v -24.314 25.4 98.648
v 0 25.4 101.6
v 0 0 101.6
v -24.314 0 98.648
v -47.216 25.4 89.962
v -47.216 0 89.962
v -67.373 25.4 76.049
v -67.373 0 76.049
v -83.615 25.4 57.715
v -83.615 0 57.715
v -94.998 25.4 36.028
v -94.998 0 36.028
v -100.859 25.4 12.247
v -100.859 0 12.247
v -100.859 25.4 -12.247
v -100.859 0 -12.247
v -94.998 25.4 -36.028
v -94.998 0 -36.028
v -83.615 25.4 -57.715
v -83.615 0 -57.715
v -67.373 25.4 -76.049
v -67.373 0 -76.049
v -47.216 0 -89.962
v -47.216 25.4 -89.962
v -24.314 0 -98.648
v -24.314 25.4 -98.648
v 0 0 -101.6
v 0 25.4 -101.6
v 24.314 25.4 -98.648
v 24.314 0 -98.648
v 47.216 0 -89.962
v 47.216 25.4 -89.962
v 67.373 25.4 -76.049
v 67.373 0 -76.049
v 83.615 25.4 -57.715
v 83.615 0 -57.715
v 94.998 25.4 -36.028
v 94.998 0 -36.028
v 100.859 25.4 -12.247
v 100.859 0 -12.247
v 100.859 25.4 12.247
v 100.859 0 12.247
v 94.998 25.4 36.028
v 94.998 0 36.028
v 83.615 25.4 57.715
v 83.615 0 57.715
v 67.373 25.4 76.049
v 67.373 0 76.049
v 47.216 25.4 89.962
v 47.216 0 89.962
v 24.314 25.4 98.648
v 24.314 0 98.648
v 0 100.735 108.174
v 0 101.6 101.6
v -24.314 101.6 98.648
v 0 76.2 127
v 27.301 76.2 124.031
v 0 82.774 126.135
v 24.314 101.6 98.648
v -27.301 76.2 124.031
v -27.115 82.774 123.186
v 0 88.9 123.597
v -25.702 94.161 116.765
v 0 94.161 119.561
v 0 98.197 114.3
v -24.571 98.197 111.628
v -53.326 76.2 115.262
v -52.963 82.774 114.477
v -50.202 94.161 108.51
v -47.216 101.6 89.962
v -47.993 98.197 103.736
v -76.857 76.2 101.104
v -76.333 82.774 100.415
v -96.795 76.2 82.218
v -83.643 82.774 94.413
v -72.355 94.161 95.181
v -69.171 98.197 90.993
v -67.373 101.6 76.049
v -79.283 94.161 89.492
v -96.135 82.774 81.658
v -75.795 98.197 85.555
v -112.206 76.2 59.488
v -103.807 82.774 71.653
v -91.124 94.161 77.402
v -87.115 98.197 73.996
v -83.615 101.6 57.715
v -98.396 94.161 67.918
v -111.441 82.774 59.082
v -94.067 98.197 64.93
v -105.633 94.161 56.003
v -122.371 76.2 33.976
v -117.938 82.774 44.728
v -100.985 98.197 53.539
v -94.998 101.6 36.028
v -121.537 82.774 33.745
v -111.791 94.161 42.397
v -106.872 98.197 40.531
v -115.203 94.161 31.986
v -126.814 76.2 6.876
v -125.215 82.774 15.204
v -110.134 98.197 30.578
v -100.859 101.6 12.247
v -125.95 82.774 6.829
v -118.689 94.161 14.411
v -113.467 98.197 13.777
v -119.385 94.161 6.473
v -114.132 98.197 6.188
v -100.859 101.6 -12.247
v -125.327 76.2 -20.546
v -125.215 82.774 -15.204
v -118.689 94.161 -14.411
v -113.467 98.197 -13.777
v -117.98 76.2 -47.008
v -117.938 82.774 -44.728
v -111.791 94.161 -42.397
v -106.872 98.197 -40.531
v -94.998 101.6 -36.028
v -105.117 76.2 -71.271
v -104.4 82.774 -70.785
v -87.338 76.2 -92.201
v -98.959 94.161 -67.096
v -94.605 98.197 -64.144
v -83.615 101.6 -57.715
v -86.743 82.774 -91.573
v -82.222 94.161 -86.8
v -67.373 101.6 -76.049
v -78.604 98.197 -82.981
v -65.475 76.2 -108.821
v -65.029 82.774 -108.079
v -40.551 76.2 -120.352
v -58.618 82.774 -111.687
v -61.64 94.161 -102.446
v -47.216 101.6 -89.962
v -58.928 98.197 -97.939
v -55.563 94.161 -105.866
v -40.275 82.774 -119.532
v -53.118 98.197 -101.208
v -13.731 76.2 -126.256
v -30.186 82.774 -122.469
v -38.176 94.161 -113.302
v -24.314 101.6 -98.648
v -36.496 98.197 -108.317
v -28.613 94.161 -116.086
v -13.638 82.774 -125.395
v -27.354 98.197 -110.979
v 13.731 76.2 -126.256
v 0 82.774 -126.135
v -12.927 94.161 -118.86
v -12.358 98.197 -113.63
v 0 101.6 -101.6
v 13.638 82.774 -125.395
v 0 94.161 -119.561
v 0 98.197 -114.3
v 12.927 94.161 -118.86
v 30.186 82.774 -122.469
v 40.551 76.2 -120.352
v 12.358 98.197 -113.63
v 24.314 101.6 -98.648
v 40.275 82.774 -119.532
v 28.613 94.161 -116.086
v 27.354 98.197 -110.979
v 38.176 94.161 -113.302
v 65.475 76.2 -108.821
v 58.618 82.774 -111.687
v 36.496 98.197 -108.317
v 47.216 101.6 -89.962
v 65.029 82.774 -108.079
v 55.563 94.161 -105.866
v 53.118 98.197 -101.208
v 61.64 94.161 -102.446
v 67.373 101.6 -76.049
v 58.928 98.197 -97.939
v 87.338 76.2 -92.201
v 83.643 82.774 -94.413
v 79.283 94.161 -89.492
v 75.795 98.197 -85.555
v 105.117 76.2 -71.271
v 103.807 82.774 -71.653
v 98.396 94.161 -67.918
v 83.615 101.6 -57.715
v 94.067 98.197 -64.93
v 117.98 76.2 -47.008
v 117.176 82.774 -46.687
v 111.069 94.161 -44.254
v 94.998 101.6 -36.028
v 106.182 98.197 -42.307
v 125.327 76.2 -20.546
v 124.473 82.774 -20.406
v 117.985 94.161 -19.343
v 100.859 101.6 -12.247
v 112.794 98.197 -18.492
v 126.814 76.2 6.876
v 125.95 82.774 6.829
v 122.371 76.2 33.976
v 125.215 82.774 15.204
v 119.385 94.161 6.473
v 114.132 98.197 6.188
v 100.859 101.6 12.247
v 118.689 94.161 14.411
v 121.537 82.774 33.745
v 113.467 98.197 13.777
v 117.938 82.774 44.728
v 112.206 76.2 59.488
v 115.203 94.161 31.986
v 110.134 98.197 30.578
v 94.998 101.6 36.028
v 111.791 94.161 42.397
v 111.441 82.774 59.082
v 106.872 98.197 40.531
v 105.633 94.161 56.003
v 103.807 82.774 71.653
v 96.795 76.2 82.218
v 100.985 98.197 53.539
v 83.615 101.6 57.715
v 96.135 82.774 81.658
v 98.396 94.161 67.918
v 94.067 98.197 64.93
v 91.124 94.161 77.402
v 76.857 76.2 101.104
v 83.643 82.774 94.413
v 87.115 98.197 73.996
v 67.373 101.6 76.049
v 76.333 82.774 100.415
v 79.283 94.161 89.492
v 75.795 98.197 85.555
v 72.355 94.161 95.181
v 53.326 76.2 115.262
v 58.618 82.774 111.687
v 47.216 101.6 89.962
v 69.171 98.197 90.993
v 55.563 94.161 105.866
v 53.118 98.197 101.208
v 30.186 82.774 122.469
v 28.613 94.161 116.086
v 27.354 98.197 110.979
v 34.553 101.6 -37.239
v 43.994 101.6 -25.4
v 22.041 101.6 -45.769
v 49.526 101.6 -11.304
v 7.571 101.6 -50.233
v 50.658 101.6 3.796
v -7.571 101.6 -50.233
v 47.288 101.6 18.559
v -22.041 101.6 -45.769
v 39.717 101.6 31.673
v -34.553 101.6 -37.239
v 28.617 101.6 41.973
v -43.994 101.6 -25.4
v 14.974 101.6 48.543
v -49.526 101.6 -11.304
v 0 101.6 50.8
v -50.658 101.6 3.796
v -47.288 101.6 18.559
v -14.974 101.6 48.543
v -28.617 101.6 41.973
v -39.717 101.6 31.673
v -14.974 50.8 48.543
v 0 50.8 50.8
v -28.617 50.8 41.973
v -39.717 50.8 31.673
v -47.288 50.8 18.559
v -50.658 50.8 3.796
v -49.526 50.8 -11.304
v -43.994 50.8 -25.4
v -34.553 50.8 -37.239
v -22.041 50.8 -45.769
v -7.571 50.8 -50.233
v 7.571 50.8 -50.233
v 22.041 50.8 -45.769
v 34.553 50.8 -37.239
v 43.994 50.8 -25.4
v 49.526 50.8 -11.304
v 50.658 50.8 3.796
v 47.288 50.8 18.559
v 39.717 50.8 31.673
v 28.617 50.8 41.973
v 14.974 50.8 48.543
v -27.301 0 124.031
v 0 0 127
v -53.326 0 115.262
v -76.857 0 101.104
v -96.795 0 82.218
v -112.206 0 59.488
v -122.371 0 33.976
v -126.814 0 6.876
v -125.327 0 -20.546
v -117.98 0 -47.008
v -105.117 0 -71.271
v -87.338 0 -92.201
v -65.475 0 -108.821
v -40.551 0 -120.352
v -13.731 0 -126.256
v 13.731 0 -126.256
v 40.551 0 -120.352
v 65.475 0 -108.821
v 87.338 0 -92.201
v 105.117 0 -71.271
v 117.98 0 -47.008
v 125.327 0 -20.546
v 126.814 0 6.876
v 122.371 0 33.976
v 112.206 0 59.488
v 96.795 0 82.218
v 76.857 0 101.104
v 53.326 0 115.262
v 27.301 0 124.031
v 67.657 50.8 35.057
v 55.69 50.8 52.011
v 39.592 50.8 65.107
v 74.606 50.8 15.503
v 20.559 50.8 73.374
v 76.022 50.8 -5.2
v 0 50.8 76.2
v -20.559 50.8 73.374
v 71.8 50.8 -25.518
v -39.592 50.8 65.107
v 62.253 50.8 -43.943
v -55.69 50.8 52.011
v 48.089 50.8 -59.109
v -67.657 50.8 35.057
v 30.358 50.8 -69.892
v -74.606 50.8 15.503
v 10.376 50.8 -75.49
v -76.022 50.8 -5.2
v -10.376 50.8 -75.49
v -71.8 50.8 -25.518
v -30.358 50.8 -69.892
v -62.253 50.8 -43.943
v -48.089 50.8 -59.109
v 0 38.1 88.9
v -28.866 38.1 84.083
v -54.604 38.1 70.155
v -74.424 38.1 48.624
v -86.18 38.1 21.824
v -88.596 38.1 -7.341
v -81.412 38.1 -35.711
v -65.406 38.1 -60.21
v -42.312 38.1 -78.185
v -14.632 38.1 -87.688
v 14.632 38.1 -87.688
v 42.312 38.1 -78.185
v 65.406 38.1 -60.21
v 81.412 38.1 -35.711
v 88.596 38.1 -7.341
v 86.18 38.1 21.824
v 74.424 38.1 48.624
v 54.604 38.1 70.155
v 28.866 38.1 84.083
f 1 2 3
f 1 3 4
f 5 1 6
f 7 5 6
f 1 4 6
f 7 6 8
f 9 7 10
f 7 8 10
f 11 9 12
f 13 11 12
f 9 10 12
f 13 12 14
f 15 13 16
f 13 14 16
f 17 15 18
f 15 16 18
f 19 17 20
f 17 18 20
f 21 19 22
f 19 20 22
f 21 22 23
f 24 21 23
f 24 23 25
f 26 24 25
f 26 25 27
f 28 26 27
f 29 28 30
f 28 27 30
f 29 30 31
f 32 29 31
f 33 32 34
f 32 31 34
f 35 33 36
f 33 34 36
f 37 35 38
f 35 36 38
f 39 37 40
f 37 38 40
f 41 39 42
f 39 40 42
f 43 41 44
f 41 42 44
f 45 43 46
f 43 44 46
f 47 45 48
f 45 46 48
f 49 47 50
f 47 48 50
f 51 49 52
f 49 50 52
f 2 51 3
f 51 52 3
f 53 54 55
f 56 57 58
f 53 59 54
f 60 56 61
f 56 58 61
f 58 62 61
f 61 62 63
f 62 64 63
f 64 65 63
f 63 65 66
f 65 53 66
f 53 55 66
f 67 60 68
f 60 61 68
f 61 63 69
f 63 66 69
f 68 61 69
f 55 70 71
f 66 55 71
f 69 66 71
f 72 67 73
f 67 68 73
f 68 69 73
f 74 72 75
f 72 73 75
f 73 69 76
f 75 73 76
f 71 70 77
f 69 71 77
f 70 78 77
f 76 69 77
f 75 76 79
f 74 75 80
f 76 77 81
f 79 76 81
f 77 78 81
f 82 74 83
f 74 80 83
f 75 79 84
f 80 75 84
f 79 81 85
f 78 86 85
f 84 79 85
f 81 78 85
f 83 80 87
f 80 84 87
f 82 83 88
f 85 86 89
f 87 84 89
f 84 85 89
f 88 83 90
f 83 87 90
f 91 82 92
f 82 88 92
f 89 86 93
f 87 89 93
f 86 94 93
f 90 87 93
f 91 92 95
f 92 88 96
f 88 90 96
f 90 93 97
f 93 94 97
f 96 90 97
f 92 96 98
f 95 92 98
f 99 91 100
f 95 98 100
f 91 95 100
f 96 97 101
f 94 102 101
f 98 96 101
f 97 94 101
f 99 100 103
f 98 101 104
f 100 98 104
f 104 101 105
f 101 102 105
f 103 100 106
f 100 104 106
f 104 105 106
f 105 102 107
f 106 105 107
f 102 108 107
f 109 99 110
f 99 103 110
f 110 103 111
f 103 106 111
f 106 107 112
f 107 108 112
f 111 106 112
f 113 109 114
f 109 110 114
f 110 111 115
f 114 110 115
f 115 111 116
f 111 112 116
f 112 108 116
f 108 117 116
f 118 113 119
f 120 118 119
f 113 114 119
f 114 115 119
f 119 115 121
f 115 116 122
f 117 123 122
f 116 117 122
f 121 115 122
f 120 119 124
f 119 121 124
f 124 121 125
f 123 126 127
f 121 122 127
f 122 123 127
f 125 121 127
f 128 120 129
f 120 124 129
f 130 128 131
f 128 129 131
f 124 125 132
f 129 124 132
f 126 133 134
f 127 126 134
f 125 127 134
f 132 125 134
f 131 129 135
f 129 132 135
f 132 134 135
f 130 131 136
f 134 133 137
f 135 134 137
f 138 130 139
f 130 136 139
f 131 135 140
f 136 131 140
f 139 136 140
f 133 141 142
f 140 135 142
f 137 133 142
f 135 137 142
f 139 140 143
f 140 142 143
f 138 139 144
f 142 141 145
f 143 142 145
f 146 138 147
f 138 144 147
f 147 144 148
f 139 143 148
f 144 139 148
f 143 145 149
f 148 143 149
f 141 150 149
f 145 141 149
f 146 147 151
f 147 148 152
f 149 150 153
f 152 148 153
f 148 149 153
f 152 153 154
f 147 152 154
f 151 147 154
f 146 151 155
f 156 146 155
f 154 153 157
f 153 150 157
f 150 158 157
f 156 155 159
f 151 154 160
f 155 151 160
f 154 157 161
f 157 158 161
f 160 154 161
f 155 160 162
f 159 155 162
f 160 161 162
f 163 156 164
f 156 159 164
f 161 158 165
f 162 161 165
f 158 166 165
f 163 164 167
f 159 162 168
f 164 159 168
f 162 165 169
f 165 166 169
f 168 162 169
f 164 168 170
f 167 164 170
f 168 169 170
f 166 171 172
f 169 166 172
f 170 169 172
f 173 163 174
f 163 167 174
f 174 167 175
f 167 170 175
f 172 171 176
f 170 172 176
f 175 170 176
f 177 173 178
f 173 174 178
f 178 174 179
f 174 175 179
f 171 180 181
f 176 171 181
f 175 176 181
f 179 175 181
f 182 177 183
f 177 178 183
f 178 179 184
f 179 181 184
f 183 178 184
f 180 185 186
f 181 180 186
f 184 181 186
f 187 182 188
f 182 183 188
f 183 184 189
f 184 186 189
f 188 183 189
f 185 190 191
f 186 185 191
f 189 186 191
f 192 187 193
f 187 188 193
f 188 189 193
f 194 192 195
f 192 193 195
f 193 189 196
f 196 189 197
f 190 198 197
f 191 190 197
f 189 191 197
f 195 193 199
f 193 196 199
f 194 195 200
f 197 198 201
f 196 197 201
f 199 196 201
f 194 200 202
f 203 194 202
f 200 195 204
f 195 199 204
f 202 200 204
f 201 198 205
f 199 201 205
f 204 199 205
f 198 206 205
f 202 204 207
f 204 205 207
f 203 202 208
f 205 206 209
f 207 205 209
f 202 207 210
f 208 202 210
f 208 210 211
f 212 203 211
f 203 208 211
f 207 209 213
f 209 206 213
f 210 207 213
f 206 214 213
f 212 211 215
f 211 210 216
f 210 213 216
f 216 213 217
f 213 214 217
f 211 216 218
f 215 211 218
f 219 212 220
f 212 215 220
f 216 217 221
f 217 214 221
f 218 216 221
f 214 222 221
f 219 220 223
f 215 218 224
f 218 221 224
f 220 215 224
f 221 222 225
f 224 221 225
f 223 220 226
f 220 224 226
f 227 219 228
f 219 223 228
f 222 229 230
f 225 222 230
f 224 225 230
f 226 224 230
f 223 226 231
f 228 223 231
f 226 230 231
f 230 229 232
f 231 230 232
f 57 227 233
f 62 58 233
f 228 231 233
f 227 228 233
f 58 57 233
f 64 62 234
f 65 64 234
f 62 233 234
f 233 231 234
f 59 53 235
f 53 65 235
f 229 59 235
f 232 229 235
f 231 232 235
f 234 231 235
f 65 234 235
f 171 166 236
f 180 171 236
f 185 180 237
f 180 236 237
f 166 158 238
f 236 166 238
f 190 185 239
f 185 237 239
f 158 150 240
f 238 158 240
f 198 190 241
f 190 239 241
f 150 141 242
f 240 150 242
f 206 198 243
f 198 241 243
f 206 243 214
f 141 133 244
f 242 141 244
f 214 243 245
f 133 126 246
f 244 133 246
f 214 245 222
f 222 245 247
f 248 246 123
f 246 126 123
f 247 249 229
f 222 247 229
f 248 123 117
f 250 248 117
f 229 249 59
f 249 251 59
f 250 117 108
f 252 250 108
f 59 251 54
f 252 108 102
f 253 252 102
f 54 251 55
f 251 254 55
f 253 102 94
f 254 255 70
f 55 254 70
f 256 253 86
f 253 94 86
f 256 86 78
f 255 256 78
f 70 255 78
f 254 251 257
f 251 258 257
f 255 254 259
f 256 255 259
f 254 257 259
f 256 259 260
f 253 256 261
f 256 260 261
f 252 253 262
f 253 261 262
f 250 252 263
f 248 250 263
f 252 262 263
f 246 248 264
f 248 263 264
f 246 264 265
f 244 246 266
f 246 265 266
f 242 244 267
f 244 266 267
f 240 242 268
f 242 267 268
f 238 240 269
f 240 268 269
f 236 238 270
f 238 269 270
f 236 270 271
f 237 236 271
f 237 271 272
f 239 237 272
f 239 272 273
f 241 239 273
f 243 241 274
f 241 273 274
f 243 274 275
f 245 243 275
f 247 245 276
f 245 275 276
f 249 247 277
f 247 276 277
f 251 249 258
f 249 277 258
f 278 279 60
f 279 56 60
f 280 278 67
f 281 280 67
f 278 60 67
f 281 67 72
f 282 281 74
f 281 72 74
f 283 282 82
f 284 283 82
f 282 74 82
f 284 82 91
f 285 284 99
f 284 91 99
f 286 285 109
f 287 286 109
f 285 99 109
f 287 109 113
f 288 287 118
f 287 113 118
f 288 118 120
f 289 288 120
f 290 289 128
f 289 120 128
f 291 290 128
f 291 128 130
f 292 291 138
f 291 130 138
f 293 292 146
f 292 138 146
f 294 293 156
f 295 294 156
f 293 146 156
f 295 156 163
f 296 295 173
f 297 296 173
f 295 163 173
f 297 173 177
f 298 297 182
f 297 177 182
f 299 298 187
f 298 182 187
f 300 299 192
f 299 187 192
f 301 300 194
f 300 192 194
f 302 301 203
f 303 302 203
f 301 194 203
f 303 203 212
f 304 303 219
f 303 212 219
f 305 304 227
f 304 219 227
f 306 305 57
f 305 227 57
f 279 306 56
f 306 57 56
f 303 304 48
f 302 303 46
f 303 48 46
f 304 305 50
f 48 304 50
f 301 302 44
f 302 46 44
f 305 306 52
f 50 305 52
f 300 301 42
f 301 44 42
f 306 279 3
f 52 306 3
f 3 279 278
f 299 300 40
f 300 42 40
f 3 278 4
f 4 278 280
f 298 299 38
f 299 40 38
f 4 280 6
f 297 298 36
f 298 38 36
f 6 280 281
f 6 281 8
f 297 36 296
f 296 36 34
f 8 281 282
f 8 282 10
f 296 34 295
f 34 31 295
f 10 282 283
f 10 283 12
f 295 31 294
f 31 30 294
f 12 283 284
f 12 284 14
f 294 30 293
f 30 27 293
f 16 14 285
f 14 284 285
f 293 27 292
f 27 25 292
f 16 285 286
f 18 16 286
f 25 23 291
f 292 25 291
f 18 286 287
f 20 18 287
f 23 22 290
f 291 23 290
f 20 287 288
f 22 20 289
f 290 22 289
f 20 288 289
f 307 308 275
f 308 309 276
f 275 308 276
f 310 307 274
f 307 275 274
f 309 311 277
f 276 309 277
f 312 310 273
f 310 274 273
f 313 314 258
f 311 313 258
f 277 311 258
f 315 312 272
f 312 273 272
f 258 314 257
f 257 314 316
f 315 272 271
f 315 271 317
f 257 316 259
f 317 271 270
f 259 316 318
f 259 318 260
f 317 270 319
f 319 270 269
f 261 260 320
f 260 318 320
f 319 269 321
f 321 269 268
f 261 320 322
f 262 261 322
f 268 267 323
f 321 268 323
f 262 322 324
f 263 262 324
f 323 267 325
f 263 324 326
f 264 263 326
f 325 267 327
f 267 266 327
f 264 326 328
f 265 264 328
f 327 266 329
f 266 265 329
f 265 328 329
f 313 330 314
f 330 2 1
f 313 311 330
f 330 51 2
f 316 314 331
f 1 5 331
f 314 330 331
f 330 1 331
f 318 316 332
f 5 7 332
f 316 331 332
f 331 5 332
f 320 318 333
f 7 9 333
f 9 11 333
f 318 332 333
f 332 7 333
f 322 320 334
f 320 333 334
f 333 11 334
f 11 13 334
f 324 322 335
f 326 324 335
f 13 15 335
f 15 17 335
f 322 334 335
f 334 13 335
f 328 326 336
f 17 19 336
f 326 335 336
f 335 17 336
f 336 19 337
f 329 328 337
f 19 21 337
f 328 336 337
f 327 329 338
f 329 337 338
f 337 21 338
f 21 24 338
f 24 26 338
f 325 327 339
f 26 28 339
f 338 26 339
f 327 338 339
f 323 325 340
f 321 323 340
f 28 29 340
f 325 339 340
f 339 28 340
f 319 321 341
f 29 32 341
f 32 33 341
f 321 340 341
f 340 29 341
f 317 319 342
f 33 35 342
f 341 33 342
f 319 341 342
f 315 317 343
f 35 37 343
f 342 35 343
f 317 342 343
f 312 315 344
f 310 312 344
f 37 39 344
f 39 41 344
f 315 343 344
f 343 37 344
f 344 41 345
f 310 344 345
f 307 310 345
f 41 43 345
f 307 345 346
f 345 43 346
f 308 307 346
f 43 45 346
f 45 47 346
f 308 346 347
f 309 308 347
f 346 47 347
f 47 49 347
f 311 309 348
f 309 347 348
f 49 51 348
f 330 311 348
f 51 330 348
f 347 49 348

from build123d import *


with BuildPart() as part:
    # Sketch1 → Base-Revolve (revolve)
    with BuildSketch(Plane.XY, mode=Mode.PRIVATE) as base_revolve_sk:
        with BuildLine():
            Line((50.8, 101.6), (50.8, 50.8))
            Line((50.8, 50.8), (76.2, 50.8))
            Line((76.2, 50.8), (101.6, 25.4))
            Line((101.6, 25.4), (101.6, 0))
            Line((101.6, 0), (127, 0))
            Line((127, 0), (127, 76.2))
            ThreePointArc((127, 76.2), (119.560512242, 94.160512242), (101.6, 101.6))
            Line((101.6, 101.6), (50.8, 101.6))
        make_face()
    revolve(base_revolve_sk.sketch.rotate(Axis((0, 127, 0), (0, -1, 0)), 90), axis=Axis((0, 127, 0), (0, -1, 0)))  # turned: the seam where the file's is


solid = part.part
